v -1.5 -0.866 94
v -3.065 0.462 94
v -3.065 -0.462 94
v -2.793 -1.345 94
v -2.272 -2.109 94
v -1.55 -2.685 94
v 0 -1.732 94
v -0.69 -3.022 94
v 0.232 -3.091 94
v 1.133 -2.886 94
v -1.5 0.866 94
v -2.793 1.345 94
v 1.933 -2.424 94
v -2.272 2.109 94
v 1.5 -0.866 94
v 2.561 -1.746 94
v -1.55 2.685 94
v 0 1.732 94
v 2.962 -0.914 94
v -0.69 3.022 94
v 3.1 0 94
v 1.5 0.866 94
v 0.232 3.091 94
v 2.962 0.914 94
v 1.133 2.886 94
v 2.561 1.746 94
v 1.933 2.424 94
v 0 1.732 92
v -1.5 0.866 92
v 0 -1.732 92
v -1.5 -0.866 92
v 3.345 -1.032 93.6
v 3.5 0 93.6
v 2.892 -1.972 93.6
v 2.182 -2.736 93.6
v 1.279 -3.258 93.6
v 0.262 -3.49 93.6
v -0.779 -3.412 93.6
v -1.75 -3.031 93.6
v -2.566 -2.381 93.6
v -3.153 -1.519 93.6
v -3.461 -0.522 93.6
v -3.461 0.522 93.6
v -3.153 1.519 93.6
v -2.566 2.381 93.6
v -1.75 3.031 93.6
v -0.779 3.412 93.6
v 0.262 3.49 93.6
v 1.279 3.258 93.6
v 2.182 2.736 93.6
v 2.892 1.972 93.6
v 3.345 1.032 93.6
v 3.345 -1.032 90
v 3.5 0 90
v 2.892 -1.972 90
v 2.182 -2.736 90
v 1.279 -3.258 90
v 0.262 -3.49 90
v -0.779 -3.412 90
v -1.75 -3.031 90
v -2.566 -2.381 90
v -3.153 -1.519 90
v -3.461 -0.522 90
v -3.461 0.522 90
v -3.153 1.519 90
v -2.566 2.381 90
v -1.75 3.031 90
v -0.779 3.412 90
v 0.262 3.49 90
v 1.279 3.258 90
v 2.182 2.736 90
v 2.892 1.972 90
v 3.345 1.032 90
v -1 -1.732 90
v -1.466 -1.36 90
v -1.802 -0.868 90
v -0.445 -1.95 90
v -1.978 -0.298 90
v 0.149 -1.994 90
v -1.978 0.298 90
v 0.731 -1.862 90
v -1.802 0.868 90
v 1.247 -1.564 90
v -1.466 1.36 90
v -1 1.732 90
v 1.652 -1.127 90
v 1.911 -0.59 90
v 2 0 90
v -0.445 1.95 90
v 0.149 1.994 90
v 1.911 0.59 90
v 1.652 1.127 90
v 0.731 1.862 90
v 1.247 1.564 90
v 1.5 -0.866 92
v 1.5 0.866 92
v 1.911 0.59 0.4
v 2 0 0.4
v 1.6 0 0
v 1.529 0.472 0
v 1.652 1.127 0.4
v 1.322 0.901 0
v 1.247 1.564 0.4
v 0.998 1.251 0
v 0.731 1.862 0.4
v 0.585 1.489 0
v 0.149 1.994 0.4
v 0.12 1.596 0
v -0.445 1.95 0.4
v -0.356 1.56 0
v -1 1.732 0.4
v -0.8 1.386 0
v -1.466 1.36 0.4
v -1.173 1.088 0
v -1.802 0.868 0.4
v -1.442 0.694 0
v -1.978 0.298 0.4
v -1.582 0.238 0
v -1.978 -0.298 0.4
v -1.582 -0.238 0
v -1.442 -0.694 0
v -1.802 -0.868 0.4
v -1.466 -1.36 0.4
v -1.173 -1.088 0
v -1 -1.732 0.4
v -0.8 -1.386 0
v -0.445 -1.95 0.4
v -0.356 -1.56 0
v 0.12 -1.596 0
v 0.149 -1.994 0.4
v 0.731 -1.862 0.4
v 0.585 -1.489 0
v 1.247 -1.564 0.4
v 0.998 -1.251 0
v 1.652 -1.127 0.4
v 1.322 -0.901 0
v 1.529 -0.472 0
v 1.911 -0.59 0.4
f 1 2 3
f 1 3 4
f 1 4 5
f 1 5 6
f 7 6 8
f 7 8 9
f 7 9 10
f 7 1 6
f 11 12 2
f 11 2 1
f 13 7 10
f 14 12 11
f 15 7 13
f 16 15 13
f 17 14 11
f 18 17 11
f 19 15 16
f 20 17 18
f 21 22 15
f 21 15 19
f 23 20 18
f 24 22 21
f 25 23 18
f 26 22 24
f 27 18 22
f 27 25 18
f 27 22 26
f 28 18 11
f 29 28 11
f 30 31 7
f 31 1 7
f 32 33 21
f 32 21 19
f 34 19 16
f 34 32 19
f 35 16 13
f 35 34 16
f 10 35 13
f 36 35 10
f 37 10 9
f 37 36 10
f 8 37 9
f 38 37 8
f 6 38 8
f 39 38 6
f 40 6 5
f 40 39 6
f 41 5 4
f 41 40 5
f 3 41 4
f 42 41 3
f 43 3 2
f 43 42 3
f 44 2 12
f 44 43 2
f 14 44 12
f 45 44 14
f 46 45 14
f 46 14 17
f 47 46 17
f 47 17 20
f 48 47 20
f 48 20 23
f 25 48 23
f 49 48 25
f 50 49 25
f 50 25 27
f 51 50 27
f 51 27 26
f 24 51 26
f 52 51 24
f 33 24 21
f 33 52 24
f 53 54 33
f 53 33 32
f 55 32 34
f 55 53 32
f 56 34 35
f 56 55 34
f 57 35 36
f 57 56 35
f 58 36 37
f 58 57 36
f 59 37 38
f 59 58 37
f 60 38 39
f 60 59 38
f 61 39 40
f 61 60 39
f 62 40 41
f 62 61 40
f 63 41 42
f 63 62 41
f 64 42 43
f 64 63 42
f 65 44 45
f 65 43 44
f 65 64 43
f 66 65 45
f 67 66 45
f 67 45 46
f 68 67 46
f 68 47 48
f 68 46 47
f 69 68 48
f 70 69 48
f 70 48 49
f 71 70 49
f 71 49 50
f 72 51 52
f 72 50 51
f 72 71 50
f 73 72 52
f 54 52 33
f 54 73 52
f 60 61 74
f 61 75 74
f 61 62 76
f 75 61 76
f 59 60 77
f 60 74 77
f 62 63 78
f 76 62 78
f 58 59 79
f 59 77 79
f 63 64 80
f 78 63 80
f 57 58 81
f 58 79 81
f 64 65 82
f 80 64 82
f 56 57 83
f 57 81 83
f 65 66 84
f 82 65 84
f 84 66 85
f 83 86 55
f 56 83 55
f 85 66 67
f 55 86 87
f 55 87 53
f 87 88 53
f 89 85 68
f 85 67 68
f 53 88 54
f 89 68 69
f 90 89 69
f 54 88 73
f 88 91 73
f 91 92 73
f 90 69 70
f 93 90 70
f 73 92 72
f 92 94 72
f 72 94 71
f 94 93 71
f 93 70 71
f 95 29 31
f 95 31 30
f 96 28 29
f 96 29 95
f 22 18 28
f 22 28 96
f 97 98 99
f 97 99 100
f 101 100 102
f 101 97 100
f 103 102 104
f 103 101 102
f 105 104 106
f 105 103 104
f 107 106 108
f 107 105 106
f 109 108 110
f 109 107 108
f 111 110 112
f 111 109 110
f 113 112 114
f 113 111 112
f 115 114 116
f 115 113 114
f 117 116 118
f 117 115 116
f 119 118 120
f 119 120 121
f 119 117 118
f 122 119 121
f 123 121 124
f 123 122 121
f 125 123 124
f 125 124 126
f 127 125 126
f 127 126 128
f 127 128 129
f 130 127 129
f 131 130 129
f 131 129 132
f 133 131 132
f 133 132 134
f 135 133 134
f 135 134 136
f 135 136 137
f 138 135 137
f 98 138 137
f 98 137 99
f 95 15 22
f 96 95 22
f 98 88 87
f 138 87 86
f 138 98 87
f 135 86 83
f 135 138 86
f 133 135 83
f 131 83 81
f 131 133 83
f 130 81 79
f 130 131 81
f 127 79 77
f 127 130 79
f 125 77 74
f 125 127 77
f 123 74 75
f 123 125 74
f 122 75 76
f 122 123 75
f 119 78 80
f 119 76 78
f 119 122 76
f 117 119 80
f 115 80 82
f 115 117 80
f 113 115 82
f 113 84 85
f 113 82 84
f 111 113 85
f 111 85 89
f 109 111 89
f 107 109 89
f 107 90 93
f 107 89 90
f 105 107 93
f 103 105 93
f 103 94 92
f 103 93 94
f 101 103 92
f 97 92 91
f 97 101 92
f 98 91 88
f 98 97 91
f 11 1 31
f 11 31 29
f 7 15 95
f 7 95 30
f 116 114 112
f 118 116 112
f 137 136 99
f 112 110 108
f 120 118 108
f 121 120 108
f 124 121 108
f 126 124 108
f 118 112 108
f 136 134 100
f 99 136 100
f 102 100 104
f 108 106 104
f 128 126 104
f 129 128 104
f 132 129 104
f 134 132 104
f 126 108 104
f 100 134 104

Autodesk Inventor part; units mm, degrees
ref_plane "YZ Plane" through (0, 0, 0) normal (1, 0, 0) x (0, 1, 0)
ref_plane "XZ Plane" through (0, 0, 0) normal (0, 1, 0) x (-1, 0, 0)
ref_plane "XY Plane" through (0, 0, 0) normal (0, 0, 1) x (1, 0, 0)
sketch "Sketch1" plane through (0, 0, 0) normal (0, 0, 1) x (1, 0, 0)
  circle A0 centre (0, 0) radius 2
  dimension "Diameter" = 4
extrude "Extrusion1" add sketch "Sketch1" along normal blind 90
sketch "Sketch2" plane through (0, 0, 90) normal (0, 0, 1) x (1, 0, 0)
  circle A0 centre (0, 0) radius 2 projected
  circle A1 centre (0, 0) radius 3.5
  dimension "Head_Diameter" = 7
extrude "Extrusion2" add sketch "Sketch2" along normal blind 4 contours A0 | A1
sketch "Sketch3" plane through (0, 0, 94) normal (0, 0, 1) x (1, 0, 0)
  circle A0 centre (0, 0) radius 3.5 projected
  circle A1 centre (0, 0) radius 1.7321 construction
  line L0 (0, 1.7321) -> (1.5, 0.866)
  line L1 (1.5, -0.866) -> (1.5, 0.866)
  line L2 (0, 1.7321) -> (-1.5, 0.866)
  line L3 (-1.5, -0.866) -> (-1.5, 0.866)
  line L4 (-1.5, -0.866) -> (0, -1.7321)
  line L5 (1.5, -0.866) -> (0, -1.7321)
  dimension "Hex_Width" = 3
extrude "Extrusion3" cut sketch "Sketch3" against normal blind 2 contours L0 L1 L5 L4 L3 L2
thread "Thread1" size "M4x0.7" class "4g6g" standard "ANSI Metric M Profile" length 20
chamfer "Chamfer1" distance 0.4 angle 45 2 edges at (-3.5, 0, 94) (-2, 0, 0)
equation "\"d9\" = ThreadLength"
equation "\"d12\" = Chamfer"
equation "\"ThreadLength\" = 20"
equation "\"Chamfer\" = 0.4"
properties part number "SCREW, SOCKET HD, P, 12_9, M4X0_7X90" material "Steel, MS"
